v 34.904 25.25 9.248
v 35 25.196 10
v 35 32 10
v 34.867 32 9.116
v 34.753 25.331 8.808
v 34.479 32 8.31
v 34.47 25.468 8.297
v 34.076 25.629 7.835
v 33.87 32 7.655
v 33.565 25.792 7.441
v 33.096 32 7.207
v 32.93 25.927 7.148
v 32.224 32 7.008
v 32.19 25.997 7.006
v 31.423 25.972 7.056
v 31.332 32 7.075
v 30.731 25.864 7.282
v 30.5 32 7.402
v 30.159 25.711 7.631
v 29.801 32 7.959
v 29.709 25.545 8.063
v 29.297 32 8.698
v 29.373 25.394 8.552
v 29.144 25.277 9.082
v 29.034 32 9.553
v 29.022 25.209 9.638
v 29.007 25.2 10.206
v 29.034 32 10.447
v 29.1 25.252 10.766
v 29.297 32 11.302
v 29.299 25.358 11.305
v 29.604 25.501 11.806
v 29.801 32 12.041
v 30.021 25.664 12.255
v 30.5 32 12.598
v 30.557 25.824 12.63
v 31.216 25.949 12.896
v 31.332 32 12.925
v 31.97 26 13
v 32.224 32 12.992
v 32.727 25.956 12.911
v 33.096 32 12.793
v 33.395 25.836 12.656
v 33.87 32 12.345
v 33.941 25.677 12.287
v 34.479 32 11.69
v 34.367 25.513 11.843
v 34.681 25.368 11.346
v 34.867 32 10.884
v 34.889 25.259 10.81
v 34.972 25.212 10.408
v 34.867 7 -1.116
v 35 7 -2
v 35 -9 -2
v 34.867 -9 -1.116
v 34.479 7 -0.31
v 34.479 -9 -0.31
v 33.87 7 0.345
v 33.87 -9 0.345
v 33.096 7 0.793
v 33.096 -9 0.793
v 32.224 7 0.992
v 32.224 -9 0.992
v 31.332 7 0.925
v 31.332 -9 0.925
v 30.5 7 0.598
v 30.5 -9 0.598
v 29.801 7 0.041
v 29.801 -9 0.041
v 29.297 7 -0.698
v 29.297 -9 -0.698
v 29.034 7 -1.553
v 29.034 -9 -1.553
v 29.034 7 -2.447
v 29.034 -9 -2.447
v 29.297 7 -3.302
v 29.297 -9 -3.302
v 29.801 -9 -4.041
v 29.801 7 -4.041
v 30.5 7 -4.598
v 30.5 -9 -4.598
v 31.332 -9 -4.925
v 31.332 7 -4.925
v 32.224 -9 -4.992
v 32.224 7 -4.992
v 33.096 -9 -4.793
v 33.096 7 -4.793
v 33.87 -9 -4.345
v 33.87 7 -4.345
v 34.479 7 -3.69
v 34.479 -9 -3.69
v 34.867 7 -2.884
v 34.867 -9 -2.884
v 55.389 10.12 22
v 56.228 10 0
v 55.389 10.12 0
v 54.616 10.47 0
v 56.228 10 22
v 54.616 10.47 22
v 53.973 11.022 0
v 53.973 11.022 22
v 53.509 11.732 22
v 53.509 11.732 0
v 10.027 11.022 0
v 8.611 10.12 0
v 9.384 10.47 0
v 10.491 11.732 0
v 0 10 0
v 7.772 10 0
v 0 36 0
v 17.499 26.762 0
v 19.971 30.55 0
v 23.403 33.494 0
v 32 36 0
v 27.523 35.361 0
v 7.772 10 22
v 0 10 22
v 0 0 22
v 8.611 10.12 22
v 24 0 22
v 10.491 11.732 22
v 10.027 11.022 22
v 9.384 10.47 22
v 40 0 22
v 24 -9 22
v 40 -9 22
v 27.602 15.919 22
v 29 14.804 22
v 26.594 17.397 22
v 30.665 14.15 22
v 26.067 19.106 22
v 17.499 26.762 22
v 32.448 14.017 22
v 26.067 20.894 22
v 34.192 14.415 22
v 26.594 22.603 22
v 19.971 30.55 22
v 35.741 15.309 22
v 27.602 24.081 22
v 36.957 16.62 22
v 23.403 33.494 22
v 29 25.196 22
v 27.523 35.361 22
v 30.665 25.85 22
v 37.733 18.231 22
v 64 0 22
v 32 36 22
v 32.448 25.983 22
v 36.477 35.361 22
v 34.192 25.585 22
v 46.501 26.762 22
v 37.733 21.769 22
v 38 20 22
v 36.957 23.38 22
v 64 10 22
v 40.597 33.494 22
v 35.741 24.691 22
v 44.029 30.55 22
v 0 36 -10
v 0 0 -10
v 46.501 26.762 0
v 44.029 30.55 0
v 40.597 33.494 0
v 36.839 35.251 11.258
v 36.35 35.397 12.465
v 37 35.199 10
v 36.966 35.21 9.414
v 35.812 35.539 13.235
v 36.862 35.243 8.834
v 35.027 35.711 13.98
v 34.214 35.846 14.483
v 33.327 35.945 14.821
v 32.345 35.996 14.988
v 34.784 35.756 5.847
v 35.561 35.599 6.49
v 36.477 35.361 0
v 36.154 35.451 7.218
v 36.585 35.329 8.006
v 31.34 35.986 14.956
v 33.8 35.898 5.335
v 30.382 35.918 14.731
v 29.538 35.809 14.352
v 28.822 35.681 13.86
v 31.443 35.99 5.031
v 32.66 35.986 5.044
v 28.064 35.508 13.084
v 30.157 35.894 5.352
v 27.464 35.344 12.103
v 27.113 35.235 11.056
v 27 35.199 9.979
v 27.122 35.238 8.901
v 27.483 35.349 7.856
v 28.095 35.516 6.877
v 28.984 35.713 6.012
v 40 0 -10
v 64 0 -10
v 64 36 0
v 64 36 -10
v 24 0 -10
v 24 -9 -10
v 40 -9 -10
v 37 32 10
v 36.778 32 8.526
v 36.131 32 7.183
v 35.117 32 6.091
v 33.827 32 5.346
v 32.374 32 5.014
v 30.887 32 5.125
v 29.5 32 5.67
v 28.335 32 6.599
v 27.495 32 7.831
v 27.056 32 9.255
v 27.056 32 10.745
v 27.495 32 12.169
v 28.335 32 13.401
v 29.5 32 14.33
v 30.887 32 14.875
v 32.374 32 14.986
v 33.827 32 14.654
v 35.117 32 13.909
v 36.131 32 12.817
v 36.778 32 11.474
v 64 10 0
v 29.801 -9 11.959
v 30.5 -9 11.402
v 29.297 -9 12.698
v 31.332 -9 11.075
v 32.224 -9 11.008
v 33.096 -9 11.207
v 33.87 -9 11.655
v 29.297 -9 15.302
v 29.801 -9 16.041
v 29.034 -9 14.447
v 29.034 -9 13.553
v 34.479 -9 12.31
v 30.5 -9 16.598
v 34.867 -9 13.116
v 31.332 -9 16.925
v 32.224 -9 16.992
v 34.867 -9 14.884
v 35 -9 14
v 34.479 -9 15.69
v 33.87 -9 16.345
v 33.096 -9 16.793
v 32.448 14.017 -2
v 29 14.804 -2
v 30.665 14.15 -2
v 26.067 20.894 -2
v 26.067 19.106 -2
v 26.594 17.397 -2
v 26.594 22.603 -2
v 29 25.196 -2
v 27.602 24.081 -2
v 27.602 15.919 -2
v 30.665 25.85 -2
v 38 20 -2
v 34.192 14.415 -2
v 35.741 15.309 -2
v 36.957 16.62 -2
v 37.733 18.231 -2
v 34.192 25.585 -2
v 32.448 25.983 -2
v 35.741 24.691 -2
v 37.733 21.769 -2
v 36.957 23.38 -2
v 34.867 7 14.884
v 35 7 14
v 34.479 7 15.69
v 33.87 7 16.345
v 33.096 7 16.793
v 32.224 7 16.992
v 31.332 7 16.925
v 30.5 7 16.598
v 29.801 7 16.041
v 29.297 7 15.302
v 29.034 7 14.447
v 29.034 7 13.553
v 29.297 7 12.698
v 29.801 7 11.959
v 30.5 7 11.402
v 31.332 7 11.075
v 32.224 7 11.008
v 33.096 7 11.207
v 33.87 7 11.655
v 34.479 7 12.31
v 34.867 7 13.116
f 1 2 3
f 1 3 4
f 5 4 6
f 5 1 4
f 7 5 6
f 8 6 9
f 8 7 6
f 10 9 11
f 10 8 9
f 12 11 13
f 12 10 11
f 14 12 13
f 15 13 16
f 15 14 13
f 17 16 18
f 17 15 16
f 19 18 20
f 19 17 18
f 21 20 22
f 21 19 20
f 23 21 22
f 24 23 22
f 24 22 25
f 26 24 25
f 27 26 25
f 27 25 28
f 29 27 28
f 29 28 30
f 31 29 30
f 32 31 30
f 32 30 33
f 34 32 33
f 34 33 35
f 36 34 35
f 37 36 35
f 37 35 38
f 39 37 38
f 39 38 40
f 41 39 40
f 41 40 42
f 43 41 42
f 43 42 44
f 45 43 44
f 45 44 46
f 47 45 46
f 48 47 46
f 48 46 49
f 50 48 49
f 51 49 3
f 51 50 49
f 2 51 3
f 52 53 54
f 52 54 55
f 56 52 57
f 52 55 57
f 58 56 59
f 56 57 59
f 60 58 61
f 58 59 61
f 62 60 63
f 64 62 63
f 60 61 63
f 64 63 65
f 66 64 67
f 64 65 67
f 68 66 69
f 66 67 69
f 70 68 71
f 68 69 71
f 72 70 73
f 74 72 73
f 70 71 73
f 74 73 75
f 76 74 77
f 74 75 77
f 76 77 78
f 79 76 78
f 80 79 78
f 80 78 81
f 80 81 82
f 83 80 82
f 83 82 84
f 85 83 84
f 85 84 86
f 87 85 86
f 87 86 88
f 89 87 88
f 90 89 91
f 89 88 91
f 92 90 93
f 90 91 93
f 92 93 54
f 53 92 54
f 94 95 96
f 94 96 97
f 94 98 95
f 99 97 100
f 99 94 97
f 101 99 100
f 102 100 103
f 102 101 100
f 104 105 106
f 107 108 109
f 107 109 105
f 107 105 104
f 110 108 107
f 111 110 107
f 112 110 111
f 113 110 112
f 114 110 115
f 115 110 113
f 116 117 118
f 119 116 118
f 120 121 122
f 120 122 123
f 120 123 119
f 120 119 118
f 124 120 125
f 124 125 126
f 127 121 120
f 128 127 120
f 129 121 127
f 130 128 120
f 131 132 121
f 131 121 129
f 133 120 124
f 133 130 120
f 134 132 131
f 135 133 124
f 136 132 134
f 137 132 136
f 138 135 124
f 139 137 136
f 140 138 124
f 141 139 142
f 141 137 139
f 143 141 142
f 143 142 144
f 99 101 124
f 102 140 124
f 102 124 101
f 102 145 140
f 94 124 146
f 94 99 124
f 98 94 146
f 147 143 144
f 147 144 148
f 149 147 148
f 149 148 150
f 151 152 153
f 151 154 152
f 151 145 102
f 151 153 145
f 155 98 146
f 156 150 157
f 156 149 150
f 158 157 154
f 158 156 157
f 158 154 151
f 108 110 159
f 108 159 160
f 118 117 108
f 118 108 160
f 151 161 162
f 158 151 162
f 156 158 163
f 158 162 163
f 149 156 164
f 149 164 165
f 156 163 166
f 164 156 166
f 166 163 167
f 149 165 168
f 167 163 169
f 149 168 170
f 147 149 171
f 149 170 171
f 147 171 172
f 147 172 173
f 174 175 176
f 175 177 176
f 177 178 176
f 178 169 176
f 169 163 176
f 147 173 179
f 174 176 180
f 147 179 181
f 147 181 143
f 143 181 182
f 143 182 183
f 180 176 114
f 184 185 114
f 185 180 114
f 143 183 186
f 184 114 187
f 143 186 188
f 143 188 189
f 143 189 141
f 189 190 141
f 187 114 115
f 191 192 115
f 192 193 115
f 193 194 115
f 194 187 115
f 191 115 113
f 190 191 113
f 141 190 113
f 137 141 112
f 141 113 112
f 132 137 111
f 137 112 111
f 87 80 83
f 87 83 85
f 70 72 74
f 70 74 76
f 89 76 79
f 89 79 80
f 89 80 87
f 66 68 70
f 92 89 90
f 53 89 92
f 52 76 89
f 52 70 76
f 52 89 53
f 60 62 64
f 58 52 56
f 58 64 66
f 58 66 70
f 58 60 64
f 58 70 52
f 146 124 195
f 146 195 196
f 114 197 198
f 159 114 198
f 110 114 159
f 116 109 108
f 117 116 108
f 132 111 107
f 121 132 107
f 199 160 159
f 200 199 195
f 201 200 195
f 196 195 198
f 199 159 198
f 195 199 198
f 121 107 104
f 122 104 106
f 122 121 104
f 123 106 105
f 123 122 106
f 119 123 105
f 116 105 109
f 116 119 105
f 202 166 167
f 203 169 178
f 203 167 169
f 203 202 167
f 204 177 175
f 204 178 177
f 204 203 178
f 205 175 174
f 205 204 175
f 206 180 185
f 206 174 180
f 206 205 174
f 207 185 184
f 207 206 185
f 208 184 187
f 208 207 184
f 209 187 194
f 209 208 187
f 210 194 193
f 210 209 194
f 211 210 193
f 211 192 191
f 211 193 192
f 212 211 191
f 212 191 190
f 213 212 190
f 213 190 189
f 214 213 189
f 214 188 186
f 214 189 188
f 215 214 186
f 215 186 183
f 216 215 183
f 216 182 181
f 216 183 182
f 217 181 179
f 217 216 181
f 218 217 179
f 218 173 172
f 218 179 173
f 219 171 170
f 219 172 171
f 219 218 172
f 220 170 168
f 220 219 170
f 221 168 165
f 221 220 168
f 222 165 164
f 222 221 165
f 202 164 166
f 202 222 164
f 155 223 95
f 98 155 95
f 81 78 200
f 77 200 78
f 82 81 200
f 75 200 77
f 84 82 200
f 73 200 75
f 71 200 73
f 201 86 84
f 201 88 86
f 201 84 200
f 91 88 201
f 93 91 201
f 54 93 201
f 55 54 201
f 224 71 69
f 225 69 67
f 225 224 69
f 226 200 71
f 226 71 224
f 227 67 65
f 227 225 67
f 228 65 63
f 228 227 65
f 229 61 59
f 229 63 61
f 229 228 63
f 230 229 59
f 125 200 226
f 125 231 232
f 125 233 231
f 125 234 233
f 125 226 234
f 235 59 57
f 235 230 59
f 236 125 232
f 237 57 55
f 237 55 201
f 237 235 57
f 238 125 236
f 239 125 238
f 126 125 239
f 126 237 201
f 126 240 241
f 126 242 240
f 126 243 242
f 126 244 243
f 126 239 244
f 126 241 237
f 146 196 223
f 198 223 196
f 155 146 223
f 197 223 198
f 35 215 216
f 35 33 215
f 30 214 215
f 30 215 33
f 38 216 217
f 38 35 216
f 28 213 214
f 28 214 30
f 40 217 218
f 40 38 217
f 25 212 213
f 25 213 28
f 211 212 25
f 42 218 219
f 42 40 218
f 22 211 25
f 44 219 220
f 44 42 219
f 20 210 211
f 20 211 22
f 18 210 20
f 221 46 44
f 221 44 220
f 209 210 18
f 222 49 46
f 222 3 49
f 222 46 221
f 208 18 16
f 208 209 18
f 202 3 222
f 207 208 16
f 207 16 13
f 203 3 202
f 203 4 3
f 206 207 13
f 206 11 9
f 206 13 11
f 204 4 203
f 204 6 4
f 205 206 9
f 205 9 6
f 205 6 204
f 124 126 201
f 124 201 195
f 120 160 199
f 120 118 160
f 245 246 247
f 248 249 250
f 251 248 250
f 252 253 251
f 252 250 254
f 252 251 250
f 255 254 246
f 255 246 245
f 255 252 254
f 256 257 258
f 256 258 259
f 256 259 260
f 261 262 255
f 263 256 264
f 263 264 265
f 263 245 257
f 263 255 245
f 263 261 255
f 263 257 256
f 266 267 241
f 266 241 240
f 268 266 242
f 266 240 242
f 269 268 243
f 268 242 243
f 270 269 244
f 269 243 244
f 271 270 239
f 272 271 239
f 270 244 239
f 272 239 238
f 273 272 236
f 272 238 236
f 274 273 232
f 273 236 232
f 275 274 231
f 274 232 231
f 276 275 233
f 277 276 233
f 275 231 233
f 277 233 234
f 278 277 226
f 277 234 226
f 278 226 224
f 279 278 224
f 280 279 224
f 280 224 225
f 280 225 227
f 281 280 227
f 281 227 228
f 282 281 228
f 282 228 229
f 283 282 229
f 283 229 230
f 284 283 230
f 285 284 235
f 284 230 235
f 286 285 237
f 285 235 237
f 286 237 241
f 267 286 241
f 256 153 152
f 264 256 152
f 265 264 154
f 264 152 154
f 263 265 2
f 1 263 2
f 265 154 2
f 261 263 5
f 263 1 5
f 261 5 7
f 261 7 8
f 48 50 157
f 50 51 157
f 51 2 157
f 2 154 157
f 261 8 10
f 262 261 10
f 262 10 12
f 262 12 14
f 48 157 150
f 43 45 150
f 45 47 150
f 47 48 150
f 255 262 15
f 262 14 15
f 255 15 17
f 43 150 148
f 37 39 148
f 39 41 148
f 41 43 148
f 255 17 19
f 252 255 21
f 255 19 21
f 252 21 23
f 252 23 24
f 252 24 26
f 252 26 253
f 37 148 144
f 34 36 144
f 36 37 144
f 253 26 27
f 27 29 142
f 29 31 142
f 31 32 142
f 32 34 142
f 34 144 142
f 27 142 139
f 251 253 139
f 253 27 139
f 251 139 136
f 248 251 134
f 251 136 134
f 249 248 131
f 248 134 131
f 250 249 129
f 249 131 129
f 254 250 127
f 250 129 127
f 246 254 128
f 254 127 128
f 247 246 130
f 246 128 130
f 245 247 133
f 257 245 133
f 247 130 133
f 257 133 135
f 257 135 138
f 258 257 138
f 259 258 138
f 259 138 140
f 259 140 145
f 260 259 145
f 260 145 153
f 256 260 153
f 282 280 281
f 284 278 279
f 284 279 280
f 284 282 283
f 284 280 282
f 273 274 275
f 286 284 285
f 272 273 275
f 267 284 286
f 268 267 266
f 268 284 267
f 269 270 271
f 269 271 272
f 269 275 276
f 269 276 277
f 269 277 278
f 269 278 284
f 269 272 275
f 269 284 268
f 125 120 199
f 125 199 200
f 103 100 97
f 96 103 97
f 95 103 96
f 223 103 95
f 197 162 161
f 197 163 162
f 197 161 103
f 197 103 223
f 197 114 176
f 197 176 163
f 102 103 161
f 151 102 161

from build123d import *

# Parameters (mm, degrees)
BOSS_EXTRUDE2_DEPTH                      = 22
BOSS_EXTRUDE3_DEPTH                      = 10
FILLET1_R                                = 3
SKETCH3_R                                = 6
CUT_EXTRUDE1_DEPTH                       = 24
SKETCH4_R                                = 3
CUT_EXTRUDE2_DEPTH                       = 16
CBORE_START                              = 32
CBORE_FOR_M12_HEX_HEAD_BOLT3_OUTLINE_R   = 5
CBORE_FOR_M12_HEX_HEAD_BOLT3_DEPTH       = 4
CBORE_START_2                            = 25.196151292
CBORE_FOR_M12_HEX_HEAD_BOLT3_2_OUTLINE_R = 3
CBORE_FOR_M12_HEX_HEAD_BOLT3_2_DEPTH     = 6.803848708


# Read off the part's stored shape, not the designer's step: CBORE for M12 Hex Head Bolt3
with BuildPart() as part:
    # Sketch2 → Boss-Extrude2 (new body)
    with BuildSketch(Plane.XY):
        with BuildLine():
            Line((9.682876715, 10), (0, 10))
            Line((0, 10), (0, 0))
            Line((0, 0), (24, 0))
            Line((24, 0), (24, -9))
            Line((24, -9), (40, -9))
            Line((40, -9), (40, 0))
            Line((40, 0), (64, 0))
            Line((64, 0), (64, 10))
            Line((64, 10), (54.317123285, 10))
            Line((54.317123285, 10), (46.500924593, 26.761892188))
            ThreePointArc((46.500924593, 26.761892188), (32, 36), (17.499075407, 26.761892188))
            Line((17.499075407, 26.761892188), (9.682876715, 10))
        make_face()
    extrude(amount=BOSS_EXTRUDE2_DEPTH)

    # Sketch2<4> → Boss-Extrude3 (add)
    with BuildSketch(Plane.XY):
        Polygon((0, 0), (24, 0), (24, -9), (40, -9), (40, 0), (64, 0), (64, 36), (0, 36), align=None)
    extrude(amount=-BOSS_EXTRUDE3_DEPTH)

    # Fillet1
    fillet1_edges = [part.edges().sort_by_distance(p)[0] for p in [
        (54.317123285, 10, 11),
        (9.682876715, 10, 11),
    ]]
    fillet(fillet1_edges, radius=FILLET1_R)

    # Sketch3 → Cut-Extrude1 (cut)
    with BuildSketch(Plane.XY.offset(22)):
        with Locations((32, 20)):
            Circle(SKETCH3_R)
    extrude(amount=-CUT_EXTRUDE1_DEPTH, mode=Mode.SUBTRACT)

    # Sketch4 → Cut-Extrude2 (cut)
    with BuildSketch(Plane.XZ.offset(9)):
        with Locations((32, 14)):
            Circle(SKETCH4_R)
        with Locations((32, -2)):
            Circle(SKETCH4_R)
    extrude(amount=-CUT_EXTRUDE2_DEPTH, mode=Mode.SUBTRACT)

    # CBORE for M12 Hex Head Bolt3 outline → CBORE for M12 Hex Head Bolt3 (cut)
    with BuildSketch(Plane(origin=(0, 0, 0), x_dir=(1, 0, 0), z_dir=(0, 1, 0)).offset(CBORE_START)):
        with Locations((32, -10)):
            Circle(CBORE_FOR_M12_HEX_HEAD_BOLT3_OUTLINE_R)
    extrude(amount=CBORE_FOR_M12_HEX_HEAD_BOLT3_DEPTH, mode=Mode.SUBTRACT)

    # CBORE for M12 Hex Head Bolt3 2 outline → CBORE for M12 Hex Head Bolt3 2 (cut)
    with BuildSketch(Plane(origin=(0, 0, 0), x_dir=(1, 0, 0), z_dir=(0, 1, 0)).offset(CBORE_START_2)):
        with Locations((32, -10)):
            Circle(CBORE_FOR_M12_HEX_HEAD_BOLT3_2_OUTLINE_R)
    extrude(amount=CBORE_FOR_M12_HEX_HEAD_BOLT3_2_DEPTH, mode=Mode.SUBTRACT)


solid = part.part
